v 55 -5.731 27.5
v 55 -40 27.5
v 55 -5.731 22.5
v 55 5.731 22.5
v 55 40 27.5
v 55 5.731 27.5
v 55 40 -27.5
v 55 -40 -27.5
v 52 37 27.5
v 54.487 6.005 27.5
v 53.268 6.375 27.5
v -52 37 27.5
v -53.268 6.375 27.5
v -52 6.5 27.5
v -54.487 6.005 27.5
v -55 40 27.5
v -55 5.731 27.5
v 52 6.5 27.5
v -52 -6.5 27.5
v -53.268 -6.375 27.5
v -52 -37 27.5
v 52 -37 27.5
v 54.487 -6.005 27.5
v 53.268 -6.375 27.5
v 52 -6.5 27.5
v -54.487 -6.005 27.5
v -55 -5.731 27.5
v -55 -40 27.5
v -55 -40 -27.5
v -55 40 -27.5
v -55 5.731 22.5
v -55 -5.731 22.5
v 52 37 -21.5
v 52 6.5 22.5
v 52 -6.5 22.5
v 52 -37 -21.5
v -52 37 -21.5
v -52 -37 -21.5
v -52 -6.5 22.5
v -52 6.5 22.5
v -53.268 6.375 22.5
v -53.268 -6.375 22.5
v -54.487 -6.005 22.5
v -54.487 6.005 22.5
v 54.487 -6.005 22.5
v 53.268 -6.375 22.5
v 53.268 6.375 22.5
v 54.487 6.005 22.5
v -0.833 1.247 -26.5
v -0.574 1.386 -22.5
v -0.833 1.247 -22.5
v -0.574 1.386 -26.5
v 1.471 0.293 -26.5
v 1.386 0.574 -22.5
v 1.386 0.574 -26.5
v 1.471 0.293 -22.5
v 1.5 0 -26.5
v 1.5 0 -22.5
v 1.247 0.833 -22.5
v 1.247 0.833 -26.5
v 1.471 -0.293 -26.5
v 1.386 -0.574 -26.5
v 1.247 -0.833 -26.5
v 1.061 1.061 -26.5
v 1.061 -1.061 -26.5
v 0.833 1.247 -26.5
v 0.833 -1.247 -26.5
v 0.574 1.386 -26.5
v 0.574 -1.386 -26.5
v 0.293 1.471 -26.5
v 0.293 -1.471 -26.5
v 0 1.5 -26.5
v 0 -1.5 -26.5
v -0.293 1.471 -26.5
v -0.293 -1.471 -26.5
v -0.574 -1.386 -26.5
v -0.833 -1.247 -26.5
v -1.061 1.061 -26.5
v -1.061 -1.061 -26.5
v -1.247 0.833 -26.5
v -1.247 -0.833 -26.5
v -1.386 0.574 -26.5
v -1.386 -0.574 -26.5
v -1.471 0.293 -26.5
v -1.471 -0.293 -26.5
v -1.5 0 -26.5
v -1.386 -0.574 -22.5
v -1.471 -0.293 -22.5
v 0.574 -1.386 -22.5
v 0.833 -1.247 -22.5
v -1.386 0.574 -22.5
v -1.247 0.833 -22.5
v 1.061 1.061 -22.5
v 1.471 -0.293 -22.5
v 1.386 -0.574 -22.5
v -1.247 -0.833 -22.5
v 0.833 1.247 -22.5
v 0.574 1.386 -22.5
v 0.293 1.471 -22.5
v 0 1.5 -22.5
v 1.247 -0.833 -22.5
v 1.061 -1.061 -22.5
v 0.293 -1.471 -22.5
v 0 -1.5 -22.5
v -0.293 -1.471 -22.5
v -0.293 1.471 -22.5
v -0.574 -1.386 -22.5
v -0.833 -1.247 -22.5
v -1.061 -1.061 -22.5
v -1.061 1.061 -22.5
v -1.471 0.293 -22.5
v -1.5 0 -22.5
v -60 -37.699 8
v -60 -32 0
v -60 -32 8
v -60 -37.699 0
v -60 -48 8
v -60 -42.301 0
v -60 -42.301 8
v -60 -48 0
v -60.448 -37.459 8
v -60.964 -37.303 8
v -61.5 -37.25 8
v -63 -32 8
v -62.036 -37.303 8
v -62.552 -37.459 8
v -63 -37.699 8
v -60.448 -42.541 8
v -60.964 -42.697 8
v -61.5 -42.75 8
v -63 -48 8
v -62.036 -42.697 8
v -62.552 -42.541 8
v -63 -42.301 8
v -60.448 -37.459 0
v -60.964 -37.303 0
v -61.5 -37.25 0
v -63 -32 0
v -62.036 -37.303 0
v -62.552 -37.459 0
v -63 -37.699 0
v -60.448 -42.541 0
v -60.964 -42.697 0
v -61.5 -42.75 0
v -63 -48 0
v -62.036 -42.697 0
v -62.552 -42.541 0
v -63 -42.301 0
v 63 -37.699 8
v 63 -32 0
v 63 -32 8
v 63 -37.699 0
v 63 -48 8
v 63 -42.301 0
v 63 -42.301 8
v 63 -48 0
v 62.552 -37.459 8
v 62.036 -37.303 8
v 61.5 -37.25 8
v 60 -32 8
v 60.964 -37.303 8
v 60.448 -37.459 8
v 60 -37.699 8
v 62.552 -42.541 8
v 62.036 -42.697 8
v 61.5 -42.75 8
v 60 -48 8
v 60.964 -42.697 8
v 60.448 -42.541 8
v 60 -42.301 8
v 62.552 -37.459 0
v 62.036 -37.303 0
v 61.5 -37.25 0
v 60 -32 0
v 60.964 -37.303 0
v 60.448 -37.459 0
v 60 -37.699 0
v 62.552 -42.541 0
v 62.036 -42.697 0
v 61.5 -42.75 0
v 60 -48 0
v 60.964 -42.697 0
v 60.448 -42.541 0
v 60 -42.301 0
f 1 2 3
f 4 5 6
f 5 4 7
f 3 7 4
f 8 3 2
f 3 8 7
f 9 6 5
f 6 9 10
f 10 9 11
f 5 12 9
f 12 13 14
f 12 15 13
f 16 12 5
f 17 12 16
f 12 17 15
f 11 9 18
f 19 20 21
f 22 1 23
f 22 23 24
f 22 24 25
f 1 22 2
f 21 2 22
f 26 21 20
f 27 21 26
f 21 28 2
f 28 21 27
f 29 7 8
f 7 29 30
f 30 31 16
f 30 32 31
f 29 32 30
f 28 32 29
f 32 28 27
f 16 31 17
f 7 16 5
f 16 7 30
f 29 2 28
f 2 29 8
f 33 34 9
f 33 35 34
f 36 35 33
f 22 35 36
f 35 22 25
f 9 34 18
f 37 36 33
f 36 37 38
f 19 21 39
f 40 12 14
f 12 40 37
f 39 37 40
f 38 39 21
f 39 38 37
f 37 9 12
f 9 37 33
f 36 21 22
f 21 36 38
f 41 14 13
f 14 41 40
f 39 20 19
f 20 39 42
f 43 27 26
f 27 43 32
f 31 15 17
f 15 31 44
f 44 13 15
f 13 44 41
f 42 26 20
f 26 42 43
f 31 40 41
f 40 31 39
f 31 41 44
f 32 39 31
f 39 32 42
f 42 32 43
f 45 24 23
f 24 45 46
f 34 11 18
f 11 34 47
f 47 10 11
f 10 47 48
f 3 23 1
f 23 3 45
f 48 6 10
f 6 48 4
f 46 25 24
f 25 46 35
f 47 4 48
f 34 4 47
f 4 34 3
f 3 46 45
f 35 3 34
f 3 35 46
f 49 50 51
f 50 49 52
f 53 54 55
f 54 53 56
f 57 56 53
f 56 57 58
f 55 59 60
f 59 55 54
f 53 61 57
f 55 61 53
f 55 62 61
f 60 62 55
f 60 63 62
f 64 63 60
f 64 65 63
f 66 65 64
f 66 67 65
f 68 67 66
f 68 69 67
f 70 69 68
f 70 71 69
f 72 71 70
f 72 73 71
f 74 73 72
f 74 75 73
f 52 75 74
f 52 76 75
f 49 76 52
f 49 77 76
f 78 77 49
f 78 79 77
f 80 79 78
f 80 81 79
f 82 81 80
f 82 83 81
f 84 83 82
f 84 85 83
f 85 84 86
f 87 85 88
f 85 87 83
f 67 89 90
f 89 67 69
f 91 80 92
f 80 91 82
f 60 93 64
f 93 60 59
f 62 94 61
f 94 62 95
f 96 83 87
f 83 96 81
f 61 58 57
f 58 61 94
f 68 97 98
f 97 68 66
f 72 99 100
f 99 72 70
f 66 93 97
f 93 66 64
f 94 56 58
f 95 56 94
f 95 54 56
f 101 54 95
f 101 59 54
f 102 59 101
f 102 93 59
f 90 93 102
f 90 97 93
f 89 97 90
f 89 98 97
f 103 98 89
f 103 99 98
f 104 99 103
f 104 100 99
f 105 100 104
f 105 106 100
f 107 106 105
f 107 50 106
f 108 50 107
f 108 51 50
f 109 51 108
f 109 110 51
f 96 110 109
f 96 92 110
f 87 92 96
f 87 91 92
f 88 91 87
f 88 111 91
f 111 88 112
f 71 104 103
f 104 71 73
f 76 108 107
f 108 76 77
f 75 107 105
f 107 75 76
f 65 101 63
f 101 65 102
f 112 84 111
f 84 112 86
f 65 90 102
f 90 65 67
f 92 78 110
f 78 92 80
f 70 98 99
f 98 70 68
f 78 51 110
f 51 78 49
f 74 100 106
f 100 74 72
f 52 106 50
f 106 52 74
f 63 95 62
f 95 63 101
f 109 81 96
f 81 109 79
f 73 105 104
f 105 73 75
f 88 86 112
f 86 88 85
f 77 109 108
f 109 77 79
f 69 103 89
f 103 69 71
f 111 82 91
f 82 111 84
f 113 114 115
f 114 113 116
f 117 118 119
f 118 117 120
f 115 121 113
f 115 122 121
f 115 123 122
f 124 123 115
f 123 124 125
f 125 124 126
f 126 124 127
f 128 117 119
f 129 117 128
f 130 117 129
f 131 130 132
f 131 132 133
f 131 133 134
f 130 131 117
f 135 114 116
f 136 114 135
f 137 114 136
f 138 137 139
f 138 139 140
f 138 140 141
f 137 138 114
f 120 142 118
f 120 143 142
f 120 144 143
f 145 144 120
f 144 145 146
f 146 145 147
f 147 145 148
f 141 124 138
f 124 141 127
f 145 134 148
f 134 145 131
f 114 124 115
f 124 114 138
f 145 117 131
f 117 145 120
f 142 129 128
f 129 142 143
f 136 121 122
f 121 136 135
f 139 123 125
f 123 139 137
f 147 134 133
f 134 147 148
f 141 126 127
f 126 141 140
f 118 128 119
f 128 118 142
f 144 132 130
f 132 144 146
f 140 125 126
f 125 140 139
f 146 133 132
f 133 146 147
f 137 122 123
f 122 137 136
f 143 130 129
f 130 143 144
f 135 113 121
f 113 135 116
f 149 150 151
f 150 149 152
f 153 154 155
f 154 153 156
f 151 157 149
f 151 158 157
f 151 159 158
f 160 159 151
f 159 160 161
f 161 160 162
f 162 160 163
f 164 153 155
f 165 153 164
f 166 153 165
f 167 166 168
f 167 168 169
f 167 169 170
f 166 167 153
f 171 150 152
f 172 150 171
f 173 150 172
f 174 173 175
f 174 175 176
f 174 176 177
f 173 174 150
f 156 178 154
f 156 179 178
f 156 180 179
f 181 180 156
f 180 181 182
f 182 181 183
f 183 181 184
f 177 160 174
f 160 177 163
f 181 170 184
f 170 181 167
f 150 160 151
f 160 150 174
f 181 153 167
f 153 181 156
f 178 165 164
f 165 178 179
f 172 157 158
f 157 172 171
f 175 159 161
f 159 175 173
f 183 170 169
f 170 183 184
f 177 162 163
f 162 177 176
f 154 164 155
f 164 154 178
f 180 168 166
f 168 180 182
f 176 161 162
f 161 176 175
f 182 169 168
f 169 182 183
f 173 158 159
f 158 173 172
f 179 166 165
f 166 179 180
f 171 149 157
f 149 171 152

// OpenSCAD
// BALUN/UNUN HF COMPACT ENCLOSURE — FDM 3D-PRINTABLE
// Purpose: Weatherproof enclosure for HF balun/unun devices
// Dimensions: 110×80×55 mm (fits FDM printer bed)
// Features: SO-239 connectors (opposite ends), O-ring groove, mounting tabs
// Material: PETG recommended (UV-resistant), ABS acceptable
// Print time: ~4–6 hours @ 0.2mm layer height
// Filament: ~50–70 grams

// CUSTOMIZATION PARAMETERS
$fn = 32;  // Cylinder quality (32 = smooth, 16 = fast)

// Box dimensions (external)
box_length = 110;   // Front to back (SO-239 to SO-239)
box_width = 80;     // Left to right
box_height = 55;    // Top to bottom
wall_thickness = 3; // Perimeter wall (3mm recommended)

// Internal cavity dimensions
internal_length = box_length - 2 * wall_thickness;
internal_width = box_width - 2 * wall_thickness;
internal_height = box_height - 2 * wall_thickness;

// SO-239 connector specifications
so239_diameter = 13.5;  // Outer diameter of bushing
so239_hole = 13.0;      // Hole to drill for SO-239
so239_z_pos = box_height / 2;  // Vertical center

// O-ring groove (silicone seal on lid)
oring_diameter = 78;    // ID of O-ring groove
oring_depth = 2.5;      // Groove depth

// Mounting tabs (M5 bolt holes)
tab_thickness = 3;
tab_height = 8;
bolt_hole_diameter = 5.5;  // For M5 bolt

module base_box() {
    difference() {
        // Outer envelope
        cube([box_length, box_width, box_height], center=true);

        // Internal cavity
        translate([0, 0, wall_thickness])
            cube([internal_length, internal_width, internal_height], center=true);

        // SO-239 connector hole (front)
        translate([-box_length/2 + wall_thickness, 0, so239_z_pos])
            cylinder(h=10, r=so239_hole/2, center=true);

        // SO-239 connector hole (rear)
        translate([box_length/2 - wall_thickness, 0, so239_z_pos])
            cylinder(h=10, r=so239_hole/2, center=true);

        // Drain hole (bottom, center)
        translate([0, 0, -box_height/2 + wall_thickness])
            cylinder(h=wall_thickness+1, r=1.5, center=true);
    }
}

module mounting_tabs() {
    // Left tab (M5 bolt hole)
    translate([-box_length/2 - 8, -box_width/2 - 8, 0]) {
        difference() {
            cube([tab_thickness, 16, tab_height], center=false);
            // M5 bolt hole
            translate([tab_thickness/2, 8, tab_height/2])
                cylinder(h=tab_height+2, r=bolt_hole_diameter/2, center=true);
        }
    }

    // Right tab (M5 bolt hole)
    translate([box_length/2 + 5, -box_width/2 - 8, 0]) {
        difference() {
            cube([tab_thickness, 16, tab_height], center=false);
            translate([tab_thickness/2, 8, tab_height/2])
                cylinder(h=tab_height+2, r=bolt_hole_diameter/2, center=true);
        }
    }
}

module lid() {
    // Top cover plate (separate piece)
    difference() {
        cube([box_length - 2*wall_thickness, box_width - 2*wall_thickness, 3], center=true);

        // O-ring groove (silicone seal surface)
        translate([0, 0, -0.5])
            cylinder(h=1.5, r=oring_diameter/2, center=true);
    }
}

// ASSEMBLY (uncomment to visualize)
base_box();
mounting_tabs();

// Show lid position (commented out for printing base only)
// translate([0, 0, box_height/2 + 3])
//     lid();

// PRINTING INSTRUCTIONS
// 1. Print base_box() as main body (standing upright)
// 2. Print mounting_tabs() (or include in same print)
// 3. Print lid() separately (easier to remove)
// 4. Post-processing:
//    - Clean support material
//    - Sand connector hole area (ensure SO-239 fits smoothly)
//    - Paint exterior (UV-resistant coating recommended)
//    - Install O-ring in groove (silicone, 78mm ID)
// 5. Assembly:
//    - Insert SO-239 connectors in front/rear holes (solder from inside)
//    - Route internal wiring (avoid sharp edges)
//    - Apply silicone caulk around O-ring (if potting)
//    - Attach lid with self-tapping screws (3–4 screws, M3 recommended)

// MATERIAL NOTES
// PETG: Excellent UV resistance, flexible (won't crack), print at 240°C
// ABS: Stronger, less UV-resistant, requires heated bed (100°C)
// PLA: Weak for outdoor use, breaks under thermal stress

// CUSTOMIZATION EXAMPLES
// For compact VHF/UHF (reduce height):
//   box_height = 40; box_length = 90; box_width = 60;
// For QRO/stacked cores (increase size):
//   box_height = 65; box_length = 120; box_width = 100;
// For single BNC connector:
//   Add second hole (different diameter), mirror SO-239 hole definition
